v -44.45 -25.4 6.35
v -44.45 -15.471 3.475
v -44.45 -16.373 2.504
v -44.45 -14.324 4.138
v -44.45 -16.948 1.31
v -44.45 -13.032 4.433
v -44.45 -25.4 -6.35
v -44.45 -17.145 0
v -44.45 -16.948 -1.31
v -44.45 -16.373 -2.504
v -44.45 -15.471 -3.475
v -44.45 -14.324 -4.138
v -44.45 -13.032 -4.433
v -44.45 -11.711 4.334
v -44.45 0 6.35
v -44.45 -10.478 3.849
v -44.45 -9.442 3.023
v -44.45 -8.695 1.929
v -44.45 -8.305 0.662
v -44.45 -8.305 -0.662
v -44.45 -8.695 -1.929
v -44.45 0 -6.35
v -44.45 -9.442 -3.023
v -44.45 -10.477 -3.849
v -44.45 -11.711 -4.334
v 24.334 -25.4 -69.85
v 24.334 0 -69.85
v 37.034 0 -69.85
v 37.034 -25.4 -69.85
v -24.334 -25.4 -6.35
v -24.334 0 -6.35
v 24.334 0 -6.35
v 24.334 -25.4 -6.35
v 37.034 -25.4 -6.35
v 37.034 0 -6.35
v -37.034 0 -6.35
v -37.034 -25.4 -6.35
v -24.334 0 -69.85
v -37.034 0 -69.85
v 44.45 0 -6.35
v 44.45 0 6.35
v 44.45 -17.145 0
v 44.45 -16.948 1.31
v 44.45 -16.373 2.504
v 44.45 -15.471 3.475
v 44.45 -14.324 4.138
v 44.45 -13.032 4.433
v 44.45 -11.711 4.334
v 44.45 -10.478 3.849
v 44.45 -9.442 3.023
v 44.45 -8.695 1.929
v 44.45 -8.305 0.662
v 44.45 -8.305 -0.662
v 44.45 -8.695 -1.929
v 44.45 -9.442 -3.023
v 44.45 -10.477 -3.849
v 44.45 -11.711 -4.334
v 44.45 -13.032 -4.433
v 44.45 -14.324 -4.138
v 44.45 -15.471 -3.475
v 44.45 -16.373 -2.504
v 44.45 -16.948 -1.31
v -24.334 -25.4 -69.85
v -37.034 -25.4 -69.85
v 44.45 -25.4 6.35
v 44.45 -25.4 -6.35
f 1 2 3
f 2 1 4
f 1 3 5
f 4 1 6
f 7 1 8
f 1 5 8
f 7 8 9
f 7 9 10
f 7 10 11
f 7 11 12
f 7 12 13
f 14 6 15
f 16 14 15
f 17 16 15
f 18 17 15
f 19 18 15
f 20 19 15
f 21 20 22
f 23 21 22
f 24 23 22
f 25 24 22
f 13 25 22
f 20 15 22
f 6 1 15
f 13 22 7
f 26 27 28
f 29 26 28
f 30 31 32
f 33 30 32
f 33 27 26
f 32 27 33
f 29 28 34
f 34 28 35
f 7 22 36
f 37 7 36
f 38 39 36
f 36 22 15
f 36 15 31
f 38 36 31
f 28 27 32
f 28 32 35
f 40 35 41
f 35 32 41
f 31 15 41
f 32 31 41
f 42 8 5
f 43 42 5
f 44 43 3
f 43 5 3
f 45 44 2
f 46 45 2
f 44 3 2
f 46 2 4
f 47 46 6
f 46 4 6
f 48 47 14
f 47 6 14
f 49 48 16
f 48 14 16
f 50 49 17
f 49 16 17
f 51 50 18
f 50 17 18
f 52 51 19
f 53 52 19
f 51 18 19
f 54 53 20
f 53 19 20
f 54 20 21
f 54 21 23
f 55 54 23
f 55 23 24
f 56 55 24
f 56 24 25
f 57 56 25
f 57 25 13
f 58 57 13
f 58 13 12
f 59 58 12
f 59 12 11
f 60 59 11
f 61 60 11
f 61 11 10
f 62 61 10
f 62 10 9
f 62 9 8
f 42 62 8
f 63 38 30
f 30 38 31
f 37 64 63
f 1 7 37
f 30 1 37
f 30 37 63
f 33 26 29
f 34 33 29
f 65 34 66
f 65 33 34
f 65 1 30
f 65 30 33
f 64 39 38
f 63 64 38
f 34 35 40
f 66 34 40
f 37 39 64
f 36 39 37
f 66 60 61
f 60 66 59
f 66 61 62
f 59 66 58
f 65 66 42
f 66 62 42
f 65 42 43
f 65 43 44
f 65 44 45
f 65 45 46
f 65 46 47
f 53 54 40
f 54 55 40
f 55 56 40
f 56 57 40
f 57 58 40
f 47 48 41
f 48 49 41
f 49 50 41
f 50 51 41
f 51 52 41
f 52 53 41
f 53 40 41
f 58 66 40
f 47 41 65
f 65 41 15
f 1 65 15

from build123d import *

# Parameters (mm, degrees)
F0_W     = 12.7
F0_H     = 63.5
F1_DEPTH = 25.4
F2_R     = 4.445
F3_DEPTH = 88.901


with BuildPart() as f1:
    # F0 (on Front) → F1 (new body)
    with BuildSketch(Plane.XZ):
        Polygon((37.03399, -6.35), (44.45, -6.35), (44.45, 6.35), (-44.45, 6.35), (-44.45, -6.35), (-37.03399, -6.35), (-24.33399, -6.35), (24.33399, -6.35), align=None)
        with Locations((30.68399, -38.1)):
            Rectangle(F0_W, F0_H)
        with Locations((-30.68399, -38.1)):
            Rectangle(F0_W, F0_H)
    extrude(amount=F1_DEPTH)

    # F2 (on face) → F3 (cut, through all)
    with BuildSketch(Plane(origin=(-44.45, 0, 0), x_dir=(0, -1, 0), z_dir=(-1, 0, 0))):
        with Locations((12.7, 0)):
            Circle(F2_R)
    extrude(amount=-F3_DEPTH, mode=Mode.SUBTRACT)


solid = f1.part
